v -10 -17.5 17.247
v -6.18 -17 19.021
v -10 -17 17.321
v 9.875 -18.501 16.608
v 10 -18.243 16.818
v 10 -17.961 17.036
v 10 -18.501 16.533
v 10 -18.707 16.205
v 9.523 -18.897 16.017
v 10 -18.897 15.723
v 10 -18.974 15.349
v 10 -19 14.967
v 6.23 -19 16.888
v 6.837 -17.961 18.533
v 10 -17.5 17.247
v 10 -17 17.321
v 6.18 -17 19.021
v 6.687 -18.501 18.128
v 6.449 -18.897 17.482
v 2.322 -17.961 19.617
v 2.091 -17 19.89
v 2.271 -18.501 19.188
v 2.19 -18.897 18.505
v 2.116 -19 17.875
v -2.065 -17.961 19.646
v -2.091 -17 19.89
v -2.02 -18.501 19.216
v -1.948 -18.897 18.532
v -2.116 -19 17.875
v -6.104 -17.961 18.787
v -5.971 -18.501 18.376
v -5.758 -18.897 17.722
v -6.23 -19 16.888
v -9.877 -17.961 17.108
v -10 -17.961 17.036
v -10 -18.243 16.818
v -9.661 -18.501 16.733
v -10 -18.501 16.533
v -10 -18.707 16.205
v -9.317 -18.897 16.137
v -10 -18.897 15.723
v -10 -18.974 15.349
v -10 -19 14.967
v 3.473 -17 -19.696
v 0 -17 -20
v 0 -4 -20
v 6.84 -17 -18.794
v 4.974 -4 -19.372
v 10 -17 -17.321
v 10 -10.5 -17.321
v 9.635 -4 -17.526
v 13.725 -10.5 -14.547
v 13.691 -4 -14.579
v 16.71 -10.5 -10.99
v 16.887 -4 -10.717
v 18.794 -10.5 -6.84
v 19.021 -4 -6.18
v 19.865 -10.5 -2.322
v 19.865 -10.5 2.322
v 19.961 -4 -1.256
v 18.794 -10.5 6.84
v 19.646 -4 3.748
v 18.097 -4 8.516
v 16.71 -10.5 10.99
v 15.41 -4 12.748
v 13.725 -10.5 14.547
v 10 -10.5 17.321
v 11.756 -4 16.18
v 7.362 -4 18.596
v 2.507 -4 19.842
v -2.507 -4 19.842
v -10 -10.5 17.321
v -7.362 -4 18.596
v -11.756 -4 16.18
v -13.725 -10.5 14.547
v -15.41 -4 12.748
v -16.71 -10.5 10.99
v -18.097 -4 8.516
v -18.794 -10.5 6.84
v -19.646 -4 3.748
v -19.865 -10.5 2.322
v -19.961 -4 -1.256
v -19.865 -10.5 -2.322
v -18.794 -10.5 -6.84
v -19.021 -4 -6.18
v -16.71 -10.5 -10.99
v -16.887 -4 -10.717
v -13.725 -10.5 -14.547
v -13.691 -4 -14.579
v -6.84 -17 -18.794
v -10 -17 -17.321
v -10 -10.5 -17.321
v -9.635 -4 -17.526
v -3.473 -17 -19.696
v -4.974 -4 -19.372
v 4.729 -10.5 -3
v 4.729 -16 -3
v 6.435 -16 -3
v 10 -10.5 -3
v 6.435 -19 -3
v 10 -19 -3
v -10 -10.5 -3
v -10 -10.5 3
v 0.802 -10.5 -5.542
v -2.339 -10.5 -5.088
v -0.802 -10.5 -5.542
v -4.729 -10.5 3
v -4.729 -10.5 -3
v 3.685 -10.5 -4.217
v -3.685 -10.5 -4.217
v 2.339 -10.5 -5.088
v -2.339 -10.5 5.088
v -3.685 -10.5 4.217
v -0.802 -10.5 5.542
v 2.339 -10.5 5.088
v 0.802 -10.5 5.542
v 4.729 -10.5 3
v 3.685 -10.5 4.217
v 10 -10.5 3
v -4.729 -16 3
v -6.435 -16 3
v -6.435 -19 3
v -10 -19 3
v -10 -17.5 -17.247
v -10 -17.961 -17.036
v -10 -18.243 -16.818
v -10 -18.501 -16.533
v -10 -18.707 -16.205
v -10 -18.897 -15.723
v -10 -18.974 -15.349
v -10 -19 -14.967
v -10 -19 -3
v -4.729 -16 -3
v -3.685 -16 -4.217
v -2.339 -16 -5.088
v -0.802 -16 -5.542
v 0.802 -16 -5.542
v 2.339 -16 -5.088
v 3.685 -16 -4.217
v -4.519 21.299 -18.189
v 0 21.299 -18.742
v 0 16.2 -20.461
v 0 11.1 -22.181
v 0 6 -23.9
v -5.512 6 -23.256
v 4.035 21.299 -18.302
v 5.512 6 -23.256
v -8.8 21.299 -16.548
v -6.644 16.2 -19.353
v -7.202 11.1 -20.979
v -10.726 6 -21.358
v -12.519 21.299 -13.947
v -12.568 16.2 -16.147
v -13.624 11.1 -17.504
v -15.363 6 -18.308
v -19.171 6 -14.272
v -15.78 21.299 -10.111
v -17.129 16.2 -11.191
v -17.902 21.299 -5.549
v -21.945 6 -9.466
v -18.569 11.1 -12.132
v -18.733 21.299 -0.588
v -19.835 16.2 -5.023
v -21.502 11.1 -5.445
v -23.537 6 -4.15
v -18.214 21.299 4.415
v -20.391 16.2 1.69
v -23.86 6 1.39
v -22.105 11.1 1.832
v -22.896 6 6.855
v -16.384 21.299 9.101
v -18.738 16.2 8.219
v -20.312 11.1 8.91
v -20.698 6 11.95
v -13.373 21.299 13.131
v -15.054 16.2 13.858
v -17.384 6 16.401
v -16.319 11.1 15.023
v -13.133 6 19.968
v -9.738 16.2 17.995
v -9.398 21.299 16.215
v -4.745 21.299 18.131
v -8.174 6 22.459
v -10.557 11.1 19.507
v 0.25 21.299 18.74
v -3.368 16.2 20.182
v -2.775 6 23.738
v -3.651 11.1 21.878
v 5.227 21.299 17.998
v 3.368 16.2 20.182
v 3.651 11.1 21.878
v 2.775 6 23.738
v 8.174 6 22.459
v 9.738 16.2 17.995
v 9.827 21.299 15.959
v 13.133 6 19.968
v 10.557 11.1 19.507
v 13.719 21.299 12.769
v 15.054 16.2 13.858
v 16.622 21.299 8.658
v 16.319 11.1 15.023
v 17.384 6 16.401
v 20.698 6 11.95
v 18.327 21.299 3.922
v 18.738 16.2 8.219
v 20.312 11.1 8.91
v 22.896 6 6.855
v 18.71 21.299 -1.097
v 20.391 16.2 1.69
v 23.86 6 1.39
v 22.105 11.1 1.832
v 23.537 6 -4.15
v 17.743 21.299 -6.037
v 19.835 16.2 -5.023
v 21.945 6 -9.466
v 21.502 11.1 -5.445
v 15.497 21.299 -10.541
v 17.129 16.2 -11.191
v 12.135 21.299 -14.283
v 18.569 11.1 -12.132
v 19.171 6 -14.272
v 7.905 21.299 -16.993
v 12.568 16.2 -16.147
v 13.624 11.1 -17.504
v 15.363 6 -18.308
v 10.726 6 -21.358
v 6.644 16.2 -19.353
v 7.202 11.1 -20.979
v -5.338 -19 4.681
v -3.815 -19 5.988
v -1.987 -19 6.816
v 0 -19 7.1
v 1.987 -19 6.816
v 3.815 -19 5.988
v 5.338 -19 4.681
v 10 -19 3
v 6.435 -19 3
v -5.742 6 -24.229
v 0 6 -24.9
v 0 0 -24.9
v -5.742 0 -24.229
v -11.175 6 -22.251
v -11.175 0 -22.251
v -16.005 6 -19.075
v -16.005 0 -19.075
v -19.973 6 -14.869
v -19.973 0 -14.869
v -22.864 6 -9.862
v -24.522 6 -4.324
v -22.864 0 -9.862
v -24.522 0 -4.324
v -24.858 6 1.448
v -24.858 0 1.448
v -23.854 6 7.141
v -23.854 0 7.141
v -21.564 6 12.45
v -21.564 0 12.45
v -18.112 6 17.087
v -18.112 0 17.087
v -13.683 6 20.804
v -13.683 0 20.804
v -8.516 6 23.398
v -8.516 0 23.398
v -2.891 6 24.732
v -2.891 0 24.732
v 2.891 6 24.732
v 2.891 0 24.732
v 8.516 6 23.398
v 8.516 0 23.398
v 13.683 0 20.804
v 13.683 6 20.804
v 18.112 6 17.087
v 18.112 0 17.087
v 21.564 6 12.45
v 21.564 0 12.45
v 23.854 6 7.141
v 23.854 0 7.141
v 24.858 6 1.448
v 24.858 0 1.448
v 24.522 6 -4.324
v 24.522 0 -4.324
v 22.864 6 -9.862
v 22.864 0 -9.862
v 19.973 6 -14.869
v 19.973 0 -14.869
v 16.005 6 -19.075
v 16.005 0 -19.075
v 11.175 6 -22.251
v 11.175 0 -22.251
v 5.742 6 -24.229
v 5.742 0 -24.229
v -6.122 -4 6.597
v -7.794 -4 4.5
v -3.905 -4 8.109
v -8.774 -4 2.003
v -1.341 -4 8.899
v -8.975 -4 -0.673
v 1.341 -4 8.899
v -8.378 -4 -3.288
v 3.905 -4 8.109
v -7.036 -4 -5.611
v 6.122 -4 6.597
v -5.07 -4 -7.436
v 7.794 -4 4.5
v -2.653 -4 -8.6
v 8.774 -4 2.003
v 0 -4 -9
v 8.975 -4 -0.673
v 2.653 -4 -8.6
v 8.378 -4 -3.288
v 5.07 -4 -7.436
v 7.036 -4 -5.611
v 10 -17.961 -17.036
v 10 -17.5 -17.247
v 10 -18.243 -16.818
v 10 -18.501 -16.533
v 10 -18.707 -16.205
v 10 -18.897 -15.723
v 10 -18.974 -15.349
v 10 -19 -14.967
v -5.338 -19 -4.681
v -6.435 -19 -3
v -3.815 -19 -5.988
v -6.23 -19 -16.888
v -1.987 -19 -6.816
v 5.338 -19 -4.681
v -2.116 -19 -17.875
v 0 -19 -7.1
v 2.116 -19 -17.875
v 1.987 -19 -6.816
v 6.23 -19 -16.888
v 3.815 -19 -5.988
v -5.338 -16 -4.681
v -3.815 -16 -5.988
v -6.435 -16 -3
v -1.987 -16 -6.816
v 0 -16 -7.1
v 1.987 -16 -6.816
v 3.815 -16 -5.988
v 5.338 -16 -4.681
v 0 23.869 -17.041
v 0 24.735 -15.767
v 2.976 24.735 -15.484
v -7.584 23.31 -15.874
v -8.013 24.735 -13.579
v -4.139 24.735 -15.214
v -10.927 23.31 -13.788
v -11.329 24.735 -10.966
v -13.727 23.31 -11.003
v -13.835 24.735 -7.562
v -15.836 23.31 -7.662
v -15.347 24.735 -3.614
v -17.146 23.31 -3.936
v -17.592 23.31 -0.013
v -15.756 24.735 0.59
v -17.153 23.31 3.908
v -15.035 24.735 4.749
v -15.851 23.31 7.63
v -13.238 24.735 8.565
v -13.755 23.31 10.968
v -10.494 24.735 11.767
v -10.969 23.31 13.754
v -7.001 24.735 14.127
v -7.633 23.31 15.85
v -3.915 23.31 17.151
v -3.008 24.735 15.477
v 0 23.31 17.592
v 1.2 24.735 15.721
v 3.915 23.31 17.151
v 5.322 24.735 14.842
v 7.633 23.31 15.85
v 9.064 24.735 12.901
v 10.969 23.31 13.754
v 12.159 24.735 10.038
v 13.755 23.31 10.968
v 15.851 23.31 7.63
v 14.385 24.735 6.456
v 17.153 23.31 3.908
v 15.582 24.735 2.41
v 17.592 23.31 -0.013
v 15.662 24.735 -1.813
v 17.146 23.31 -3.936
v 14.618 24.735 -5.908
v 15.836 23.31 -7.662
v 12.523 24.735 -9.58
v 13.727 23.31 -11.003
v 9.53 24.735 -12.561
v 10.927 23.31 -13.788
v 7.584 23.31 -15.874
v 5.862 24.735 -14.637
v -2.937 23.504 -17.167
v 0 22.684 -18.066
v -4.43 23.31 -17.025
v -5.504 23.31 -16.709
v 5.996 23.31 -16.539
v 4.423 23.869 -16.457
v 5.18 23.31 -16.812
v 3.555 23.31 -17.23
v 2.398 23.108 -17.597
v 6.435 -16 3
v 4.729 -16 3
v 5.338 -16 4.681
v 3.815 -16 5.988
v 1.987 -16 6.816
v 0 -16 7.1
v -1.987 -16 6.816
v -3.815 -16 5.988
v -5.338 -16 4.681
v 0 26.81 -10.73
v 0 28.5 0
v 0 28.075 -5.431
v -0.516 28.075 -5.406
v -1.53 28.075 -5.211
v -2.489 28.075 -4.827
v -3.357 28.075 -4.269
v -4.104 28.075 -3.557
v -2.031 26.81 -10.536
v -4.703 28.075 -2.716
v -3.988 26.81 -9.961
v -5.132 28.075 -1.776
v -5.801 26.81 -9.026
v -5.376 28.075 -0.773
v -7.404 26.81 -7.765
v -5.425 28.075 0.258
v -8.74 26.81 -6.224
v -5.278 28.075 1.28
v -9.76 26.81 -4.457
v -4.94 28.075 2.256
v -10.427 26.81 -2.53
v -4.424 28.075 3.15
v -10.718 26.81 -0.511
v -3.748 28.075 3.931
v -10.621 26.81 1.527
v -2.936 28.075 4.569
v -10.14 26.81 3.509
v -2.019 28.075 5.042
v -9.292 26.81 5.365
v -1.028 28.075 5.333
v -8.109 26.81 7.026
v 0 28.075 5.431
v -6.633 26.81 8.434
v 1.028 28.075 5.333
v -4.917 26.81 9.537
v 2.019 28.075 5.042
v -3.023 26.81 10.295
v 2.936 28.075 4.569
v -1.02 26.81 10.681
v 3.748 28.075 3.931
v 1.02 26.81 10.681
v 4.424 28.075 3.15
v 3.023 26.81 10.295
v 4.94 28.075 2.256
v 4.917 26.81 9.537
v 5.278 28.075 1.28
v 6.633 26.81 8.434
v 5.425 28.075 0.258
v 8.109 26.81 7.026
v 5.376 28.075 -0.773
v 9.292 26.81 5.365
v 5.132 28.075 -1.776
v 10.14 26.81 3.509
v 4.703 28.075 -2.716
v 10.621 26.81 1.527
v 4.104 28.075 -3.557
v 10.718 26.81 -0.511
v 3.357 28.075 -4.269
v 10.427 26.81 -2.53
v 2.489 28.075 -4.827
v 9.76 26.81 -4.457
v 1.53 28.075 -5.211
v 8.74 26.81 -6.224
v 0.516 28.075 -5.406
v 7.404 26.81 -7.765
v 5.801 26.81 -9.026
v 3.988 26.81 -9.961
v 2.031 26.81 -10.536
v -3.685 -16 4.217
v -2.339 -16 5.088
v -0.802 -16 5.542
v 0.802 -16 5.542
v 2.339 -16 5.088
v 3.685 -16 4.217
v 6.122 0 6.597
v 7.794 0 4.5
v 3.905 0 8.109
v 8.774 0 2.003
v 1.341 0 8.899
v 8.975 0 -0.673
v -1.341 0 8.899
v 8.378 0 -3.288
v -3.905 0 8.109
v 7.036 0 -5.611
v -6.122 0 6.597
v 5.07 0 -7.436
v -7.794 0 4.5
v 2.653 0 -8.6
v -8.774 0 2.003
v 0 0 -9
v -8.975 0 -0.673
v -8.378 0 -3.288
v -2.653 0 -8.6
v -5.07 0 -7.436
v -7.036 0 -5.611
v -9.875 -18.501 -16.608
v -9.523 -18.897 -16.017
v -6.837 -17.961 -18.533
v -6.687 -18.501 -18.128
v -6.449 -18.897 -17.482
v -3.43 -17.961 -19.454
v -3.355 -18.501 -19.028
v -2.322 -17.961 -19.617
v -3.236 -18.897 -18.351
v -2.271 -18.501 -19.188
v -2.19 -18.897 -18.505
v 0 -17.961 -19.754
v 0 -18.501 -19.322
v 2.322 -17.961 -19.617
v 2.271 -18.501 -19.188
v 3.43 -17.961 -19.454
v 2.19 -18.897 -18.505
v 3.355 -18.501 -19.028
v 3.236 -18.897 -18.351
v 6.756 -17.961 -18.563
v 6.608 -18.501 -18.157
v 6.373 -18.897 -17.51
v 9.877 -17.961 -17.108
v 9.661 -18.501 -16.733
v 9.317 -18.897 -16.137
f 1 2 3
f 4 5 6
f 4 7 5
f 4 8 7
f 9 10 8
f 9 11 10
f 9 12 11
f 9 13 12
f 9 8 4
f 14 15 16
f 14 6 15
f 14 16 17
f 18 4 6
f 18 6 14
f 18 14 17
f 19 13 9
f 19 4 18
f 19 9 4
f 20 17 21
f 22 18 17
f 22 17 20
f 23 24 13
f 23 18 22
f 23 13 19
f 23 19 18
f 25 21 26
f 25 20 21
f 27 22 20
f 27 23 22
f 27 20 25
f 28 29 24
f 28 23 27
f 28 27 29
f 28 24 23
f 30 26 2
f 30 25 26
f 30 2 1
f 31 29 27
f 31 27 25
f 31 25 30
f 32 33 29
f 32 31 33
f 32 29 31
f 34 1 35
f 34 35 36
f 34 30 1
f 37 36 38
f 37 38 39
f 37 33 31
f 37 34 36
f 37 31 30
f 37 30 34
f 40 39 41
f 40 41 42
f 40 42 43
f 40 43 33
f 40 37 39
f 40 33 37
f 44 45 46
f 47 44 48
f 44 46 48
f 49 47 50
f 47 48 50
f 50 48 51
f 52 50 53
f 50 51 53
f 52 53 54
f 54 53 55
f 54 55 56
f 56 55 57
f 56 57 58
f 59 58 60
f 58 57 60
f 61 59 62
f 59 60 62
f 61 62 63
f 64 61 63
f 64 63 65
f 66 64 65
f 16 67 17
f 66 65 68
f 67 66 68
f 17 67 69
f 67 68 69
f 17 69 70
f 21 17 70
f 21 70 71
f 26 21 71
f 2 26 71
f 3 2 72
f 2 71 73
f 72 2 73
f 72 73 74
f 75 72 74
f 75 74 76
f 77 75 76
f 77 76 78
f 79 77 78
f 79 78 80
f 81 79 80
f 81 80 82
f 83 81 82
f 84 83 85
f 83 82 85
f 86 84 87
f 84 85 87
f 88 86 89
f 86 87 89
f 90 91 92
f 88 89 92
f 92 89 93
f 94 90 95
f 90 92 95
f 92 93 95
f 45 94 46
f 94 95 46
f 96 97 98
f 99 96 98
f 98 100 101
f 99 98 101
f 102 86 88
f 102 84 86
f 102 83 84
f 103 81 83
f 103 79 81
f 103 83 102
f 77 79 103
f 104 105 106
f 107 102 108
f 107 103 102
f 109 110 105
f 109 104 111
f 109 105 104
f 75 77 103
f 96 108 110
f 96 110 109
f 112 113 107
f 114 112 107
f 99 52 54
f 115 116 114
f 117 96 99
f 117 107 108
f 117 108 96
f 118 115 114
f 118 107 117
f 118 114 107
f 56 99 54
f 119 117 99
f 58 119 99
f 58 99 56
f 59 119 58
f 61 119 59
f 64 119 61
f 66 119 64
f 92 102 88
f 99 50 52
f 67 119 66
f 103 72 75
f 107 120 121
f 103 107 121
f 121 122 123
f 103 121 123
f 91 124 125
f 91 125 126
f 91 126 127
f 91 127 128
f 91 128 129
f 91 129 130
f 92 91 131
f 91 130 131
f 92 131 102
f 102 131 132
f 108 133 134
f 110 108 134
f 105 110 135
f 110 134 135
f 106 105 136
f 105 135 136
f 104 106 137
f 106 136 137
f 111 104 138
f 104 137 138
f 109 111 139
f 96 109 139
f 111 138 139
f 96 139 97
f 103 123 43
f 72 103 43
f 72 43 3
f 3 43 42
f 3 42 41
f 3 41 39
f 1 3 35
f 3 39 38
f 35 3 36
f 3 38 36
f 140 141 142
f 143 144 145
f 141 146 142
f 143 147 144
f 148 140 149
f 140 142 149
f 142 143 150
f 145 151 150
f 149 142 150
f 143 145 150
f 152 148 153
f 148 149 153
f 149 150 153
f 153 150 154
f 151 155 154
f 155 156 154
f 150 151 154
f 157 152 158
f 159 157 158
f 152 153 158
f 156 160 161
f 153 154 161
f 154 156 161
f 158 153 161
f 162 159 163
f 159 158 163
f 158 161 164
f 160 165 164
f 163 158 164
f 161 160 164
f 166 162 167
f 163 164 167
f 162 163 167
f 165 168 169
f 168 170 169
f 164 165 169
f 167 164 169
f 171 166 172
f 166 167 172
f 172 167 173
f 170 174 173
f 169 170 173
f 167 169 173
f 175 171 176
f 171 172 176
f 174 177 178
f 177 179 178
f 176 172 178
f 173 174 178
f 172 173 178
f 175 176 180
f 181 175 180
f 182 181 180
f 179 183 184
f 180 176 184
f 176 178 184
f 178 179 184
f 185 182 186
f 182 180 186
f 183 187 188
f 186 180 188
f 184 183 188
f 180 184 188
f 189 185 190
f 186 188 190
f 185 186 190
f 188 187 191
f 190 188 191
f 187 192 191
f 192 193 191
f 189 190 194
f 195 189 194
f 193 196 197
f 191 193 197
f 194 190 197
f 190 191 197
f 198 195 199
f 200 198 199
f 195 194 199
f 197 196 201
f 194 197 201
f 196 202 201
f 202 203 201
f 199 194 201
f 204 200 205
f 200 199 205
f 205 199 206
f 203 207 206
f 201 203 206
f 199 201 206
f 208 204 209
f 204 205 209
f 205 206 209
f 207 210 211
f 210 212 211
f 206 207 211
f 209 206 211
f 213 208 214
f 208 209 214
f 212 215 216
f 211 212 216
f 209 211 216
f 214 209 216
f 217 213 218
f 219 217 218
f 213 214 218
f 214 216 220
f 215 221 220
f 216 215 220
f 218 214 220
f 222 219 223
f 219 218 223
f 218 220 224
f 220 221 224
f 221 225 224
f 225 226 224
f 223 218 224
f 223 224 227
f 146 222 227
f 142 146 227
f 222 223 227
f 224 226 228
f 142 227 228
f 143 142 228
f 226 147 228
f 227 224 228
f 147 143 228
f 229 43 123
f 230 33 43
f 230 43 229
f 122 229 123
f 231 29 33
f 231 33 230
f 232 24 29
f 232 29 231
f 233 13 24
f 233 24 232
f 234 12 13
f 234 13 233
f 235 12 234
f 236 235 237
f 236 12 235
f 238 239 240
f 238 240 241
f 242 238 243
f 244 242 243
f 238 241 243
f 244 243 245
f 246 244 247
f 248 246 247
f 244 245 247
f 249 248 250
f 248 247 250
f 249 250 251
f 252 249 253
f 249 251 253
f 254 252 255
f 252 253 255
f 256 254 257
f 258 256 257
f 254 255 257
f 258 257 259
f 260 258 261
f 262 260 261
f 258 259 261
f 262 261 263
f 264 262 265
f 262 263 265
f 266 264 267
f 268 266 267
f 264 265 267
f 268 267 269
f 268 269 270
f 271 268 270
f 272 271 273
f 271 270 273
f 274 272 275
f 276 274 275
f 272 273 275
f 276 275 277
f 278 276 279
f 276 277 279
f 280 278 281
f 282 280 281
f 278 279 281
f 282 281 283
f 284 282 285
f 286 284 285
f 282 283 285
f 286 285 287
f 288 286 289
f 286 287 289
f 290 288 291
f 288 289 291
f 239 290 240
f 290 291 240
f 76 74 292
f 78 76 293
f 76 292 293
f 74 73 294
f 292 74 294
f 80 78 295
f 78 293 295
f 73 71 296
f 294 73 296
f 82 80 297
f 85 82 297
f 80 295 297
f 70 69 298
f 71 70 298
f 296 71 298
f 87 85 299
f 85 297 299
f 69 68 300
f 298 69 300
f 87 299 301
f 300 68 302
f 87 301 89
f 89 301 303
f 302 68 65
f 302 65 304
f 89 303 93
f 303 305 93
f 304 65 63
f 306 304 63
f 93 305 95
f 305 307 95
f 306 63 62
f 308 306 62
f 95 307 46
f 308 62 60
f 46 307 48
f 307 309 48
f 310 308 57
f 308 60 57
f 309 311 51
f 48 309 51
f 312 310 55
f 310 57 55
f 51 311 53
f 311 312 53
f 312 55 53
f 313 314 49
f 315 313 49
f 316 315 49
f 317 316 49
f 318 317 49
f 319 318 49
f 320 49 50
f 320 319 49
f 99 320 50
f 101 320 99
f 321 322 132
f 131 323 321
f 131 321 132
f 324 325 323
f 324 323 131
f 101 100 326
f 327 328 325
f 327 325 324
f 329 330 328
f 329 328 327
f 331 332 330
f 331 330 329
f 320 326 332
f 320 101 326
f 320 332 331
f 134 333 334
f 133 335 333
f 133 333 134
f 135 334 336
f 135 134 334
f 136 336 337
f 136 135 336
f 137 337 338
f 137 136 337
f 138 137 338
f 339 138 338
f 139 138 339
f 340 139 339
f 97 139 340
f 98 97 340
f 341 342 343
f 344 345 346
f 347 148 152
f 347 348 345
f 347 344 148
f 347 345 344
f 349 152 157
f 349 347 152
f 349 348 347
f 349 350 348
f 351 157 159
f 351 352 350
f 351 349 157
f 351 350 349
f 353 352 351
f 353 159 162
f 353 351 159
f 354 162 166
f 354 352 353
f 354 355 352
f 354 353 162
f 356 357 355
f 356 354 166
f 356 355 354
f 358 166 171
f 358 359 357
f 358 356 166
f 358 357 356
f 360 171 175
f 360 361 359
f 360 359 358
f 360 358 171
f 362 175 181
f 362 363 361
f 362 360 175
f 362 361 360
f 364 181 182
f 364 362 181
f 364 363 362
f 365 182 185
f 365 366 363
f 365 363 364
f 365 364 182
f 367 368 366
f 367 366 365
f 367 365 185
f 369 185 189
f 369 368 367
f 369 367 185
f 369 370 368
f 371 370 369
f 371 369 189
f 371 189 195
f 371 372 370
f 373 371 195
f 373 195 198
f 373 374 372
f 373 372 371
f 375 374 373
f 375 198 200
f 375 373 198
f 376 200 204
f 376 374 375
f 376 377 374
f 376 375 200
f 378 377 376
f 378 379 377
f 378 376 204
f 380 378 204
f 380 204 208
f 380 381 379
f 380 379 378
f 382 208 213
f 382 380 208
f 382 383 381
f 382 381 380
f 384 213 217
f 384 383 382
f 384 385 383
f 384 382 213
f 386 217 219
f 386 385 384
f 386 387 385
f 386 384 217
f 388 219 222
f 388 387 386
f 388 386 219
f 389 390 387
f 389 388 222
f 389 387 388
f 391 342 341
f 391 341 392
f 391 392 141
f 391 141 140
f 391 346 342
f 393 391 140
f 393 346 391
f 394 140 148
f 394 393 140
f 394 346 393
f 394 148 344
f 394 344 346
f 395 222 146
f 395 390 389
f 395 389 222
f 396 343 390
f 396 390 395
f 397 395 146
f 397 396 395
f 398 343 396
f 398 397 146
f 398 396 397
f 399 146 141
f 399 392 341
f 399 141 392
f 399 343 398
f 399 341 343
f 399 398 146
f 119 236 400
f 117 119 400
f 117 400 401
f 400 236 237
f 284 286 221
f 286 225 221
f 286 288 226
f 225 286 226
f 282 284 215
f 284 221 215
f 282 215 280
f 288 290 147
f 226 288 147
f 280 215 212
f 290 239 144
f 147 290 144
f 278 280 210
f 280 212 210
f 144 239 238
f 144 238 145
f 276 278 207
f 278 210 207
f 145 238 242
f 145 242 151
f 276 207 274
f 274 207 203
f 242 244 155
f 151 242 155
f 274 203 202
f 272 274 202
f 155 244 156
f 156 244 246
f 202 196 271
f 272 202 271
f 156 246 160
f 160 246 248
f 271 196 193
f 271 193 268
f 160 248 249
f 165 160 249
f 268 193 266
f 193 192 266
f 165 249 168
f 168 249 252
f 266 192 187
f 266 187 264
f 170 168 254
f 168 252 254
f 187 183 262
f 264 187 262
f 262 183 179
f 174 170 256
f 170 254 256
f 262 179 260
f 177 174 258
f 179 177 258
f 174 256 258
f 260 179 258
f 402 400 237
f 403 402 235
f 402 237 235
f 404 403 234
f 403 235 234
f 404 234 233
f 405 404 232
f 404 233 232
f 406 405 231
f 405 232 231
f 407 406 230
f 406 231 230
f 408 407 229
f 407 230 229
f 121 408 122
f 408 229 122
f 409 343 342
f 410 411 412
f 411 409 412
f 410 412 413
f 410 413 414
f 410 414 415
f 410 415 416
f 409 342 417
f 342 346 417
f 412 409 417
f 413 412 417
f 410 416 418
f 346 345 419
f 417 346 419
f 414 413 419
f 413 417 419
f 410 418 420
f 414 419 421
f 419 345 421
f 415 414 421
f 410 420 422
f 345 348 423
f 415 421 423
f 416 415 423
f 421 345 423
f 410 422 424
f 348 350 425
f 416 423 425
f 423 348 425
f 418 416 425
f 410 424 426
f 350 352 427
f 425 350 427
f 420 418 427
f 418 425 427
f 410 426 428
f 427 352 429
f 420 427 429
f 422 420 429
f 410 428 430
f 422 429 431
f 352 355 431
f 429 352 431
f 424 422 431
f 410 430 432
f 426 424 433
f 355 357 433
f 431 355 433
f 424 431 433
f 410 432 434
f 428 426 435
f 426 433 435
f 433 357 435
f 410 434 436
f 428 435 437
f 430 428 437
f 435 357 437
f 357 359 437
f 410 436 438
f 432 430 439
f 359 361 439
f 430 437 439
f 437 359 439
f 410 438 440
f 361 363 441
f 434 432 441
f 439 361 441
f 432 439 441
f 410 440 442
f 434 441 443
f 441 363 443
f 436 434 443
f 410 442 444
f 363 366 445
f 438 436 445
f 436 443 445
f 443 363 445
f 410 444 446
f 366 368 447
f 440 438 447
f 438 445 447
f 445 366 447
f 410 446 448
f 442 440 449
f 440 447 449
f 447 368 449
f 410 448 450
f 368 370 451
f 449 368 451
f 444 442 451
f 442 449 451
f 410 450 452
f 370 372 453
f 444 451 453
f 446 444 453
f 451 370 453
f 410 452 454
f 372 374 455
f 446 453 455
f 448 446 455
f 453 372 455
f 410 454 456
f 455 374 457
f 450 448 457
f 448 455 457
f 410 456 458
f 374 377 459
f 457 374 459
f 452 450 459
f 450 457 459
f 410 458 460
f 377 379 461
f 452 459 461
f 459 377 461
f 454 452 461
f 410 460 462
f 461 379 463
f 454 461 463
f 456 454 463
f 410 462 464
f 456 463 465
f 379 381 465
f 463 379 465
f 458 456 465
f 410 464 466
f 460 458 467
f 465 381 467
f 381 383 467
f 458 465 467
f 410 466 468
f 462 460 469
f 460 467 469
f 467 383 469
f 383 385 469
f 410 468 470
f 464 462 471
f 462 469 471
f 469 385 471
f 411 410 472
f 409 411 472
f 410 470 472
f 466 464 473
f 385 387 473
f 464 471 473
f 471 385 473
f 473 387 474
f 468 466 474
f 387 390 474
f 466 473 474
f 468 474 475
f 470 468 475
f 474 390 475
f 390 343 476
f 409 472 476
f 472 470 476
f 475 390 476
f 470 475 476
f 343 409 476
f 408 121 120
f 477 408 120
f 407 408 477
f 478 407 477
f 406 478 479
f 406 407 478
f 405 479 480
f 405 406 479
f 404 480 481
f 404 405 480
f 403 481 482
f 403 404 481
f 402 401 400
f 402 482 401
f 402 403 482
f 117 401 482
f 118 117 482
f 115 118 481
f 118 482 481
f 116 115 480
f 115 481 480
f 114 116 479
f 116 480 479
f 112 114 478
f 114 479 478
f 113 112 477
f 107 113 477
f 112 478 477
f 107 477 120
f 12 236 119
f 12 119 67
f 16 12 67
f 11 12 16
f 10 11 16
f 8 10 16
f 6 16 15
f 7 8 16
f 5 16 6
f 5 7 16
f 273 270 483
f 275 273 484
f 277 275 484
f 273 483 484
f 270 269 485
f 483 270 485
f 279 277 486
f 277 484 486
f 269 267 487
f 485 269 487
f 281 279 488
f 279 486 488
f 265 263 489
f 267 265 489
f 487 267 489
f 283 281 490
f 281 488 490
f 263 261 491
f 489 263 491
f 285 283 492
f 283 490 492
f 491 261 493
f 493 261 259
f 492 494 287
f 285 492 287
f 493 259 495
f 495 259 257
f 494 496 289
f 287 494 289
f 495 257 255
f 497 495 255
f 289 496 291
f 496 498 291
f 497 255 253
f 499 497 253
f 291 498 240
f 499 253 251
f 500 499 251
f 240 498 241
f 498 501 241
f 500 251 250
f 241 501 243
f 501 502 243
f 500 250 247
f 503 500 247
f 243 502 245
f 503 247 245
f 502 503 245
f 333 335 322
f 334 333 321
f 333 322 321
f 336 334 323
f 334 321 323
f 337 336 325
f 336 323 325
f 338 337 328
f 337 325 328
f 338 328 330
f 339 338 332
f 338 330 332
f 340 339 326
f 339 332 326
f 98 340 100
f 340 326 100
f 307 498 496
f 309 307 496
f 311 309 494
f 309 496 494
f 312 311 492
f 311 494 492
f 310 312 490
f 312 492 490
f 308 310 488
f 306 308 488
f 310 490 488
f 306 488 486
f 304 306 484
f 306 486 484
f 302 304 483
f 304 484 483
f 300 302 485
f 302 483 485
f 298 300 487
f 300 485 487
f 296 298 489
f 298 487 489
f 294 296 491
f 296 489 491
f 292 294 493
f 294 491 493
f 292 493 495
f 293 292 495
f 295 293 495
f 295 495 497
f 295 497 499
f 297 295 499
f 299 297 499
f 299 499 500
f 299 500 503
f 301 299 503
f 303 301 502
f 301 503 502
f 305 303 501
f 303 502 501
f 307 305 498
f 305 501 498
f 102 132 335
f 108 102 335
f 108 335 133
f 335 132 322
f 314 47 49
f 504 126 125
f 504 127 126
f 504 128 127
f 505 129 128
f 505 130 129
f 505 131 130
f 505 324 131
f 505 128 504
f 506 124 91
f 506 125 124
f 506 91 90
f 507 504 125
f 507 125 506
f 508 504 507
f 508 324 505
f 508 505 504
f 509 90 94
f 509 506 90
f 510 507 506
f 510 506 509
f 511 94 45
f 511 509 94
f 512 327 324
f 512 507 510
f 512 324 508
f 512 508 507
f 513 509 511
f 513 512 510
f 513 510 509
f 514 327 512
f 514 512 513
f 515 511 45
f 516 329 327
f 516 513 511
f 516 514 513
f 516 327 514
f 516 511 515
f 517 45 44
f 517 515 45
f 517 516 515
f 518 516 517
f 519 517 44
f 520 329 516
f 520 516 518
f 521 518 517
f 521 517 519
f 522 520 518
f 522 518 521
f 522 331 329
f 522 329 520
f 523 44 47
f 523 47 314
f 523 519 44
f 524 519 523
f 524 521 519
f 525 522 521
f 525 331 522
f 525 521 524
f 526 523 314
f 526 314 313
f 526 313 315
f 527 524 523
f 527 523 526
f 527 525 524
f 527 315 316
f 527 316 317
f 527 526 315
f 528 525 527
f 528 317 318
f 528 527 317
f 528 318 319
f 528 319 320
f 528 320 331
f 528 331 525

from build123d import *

# Parameters (mm, degrees)
FILLET1_R           = 6
SKETCH2_R           = 9
BOSS_EXTRUDE1_DEPTH = 4
SKETCH6_R           = 20
BOSS_EXTRUDE2_DEPTH = 15
SKETCH7_W           = 32.033376833
SKETCH7_H           = 34.641016152
SKETCH7_W_2         = 29.367708721
CUT_EXTRUDE1_DEPTH  = 8.5
CUT_EXTRUDE2_DEPTH  = 8.5
SKETCH10_R          = 7.1
CUT_EXTRUDE3_DEPTH  = 3
FILLET2_R           = 2


with BuildPart() as part:
    # Sketch1 → Revolve1 (revolve)
    with BuildSketch(Plane.XY, mode=Mode.PRIVATE) as revolve1_sk:
        with BuildLine():
            Line((0, 0), (0, 28.5))
            ThreePointArc((0, 28.5), (-9.340770846, 27.226775046), (-18, 23.5))
            Line((-18, 23.5), (-23.9, 6))
            Line((-23.9, 6), (-24.9, 6))
            Line((-24.9, 6), (-24.9, 0))
            Line((-24.9, 0), (0, 0))
        make_face()
    revolve(revolve1_sk.sketch.rotate(Axis((0, 0, 0), (0, 1, 0)), 270), axis=Axis((0, 0, 0), (0, 1, 0)))

    # Fillet1
    fillet1_edges = [part.edges().sort_by_distance(p)[0] for p in [
        (0, 23.5, 18),
    ]]
    fillet(fillet1_edges, radius=FILLET1_R)

    # Sketch2 → Boss-Extrude1 (add)
    with BuildSketch(Plane.XZ):
        with Locations(Location((0, 0, 0), (0, 0, 270))):
            Circle(SKETCH2_R)
    extrude(amount=BOSS_EXTRUDE1_DEPTH)

    # Sketch6 → Boss-Extrude2 (add)
    with BuildSketch(Plane.XZ.offset(4)):
        with Locations(Location((0, 0, 0), (0, 0, 270))):
            Circle(SKETCH6_R)
    extrude(amount=BOSS_EXTRUDE2_DEPTH)

    # Sketch7 → Cut-Extrude1 (cut)
    with BuildSketch(Plane.XZ.offset(19)):
        with Locations((-26.016688417, 0)):
            Rectangle(SKETCH7_W, SKETCH7_H)
        with Locations((24.68385436, 0)):
            Rectangle(SKETCH7_W_2, SKETCH7_H)
    extrude(amount=-CUT_EXTRUDE1_DEPTH, mode=Mode.SUBTRACT)

    # Sketch9 → Cut-Extrude2 (cut)
    with BuildSketch(Plane.XZ.offset(19)):
        with BuildLine():
            Line((-4.728636167, 3), (-27.5, 3))
            Line((-27.5, 3), (-27.5, -3))
            Line((-27.5, -3), (-4.728636167, -3))
            ThreePointArc((-4.728636167, -3), (0, -5.6), (4.728636167, -3))
            Line((4.728636167, -3), (27.5, -3))
            Line((27.5, -3), (27.5, 3))
            Line((27.5, 3), (4.728636167, 3))
            ThreePointArc((4.728636167, 3), (0, 5.6), (-4.728636167, 3))
        make_face()
    extrude(amount=-CUT_EXTRUDE2_DEPTH, mode=Mode.SUBTRACT)

    # Sketch10 → Cut-Extrude3 (cut)
    with BuildSketch(Plane.XZ.offset(19)):
        Circle(SKETCH10_R)
    extrude(amount=-CUT_EXTRUDE3_DEPTH, mode=Mode.SUBTRACT)

    # Fillet2
    fillet2_edges = [part.edges().sort_by_distance(p)[0] for p in [
        (0, -19, 20),
        (5.176380902, -19, -19.318516526),
    ]]
    fillet(fillet2_edges, radius=FILLET2_R)


solid = part.part
